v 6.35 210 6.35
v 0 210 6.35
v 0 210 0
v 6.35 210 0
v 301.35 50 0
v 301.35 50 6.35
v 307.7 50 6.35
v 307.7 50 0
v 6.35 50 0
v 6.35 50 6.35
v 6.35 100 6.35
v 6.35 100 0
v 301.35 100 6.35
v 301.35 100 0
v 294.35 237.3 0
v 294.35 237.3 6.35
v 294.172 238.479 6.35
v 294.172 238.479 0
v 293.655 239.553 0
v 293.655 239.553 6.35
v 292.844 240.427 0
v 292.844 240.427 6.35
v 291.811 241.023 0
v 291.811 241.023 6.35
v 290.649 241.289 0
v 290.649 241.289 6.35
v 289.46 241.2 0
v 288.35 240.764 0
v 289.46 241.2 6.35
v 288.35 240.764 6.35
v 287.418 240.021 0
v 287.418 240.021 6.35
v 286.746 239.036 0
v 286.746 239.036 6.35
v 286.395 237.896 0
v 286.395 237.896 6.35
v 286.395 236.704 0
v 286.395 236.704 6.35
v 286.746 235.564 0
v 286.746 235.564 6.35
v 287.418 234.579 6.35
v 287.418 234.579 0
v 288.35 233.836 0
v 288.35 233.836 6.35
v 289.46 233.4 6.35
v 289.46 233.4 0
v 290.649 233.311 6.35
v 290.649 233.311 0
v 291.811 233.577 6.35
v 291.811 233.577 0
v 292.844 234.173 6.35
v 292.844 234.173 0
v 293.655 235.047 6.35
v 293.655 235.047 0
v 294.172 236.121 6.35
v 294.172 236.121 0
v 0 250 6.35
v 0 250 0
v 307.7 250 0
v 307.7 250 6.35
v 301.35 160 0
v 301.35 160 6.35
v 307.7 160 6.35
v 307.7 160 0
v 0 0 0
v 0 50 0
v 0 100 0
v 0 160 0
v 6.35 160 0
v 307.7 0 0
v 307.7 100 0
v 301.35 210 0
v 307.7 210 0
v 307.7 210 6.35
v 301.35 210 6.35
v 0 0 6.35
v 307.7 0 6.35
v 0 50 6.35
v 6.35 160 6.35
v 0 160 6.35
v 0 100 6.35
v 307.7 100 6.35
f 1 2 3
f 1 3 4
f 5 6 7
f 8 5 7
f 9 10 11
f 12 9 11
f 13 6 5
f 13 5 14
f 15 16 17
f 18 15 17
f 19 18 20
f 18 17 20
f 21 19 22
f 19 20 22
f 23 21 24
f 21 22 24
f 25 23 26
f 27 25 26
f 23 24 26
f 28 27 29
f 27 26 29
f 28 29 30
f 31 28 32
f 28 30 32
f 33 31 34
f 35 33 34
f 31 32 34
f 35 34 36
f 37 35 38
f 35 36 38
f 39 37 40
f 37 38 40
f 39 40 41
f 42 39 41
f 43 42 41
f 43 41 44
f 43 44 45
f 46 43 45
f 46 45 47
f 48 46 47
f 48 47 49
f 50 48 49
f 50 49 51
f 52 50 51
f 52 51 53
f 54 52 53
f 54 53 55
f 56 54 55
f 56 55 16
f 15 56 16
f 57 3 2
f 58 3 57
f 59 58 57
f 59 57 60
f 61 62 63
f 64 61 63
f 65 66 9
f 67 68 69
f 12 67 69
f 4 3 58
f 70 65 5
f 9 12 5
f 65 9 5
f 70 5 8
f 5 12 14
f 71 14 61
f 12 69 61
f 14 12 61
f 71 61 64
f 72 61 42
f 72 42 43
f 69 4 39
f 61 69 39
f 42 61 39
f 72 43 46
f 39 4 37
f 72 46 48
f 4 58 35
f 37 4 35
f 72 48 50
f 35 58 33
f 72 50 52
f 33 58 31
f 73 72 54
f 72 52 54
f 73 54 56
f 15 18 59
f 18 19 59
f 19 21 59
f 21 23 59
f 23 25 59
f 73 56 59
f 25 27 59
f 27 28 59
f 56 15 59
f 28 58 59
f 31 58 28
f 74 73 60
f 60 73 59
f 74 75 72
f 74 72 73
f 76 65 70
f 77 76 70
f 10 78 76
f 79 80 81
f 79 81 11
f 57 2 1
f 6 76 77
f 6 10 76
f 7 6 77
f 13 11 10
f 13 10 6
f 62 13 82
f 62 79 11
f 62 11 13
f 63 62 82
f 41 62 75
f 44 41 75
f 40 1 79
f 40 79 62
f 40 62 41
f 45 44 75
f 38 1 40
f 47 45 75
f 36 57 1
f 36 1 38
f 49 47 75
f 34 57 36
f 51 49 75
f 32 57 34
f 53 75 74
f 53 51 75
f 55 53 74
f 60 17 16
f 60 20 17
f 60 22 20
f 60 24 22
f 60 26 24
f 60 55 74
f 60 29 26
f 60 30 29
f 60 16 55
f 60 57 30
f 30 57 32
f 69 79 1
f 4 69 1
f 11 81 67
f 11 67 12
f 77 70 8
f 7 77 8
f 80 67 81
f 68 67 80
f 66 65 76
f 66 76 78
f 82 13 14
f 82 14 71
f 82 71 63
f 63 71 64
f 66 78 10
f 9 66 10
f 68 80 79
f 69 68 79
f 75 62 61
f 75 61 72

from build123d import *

# Parameters (mm, degrees)
SKETCH1_W           = 307.7
SKETCH1_H           = 250
BOSS_EXTRUDE1_DEPTH = 6.35
SKETCH2_R           = 4
SKETCH2_W           = 6.35
SKETCH2_H           = 50
CUT_EXTRUDE1_DEPTH  = 397.509284254


with BuildPart() as part:
    # Sketch1 → Boss-Extrude1 (new body)
    with BuildSketch(Plane.XY):
        with Locations((153.85, 125)):
            Rectangle(SKETCH1_W, SKETCH1_H)
    extrude(amount=BOSS_EXTRUDE1_DEPTH)

    # Sketch2 → Cut-Extrude1 (cut, through all)
    with BuildSketch(Plane.XY.offset(6.35)):
        with Locations((290.35, 237.3)):
            Circle(SKETCH2_R)
        with Locations((304.525, 75)):
            Rectangle(SKETCH2_W, SKETCH2_H)
        with Locations((304.525, 185)):
            Rectangle(SKETCH2_W, SKETCH2_H)
        with Locations((3.175, 75)):
            Rectangle(SKETCH2_W, SKETCH2_H)
        with Locations((3.175, 185)):
            Rectangle(SKETCH2_W, SKETCH2_H)
    extrude(amount=-CUT_EXTRUDE1_DEPTH, mode=Mode.SUBTRACT)


solid = part.part
